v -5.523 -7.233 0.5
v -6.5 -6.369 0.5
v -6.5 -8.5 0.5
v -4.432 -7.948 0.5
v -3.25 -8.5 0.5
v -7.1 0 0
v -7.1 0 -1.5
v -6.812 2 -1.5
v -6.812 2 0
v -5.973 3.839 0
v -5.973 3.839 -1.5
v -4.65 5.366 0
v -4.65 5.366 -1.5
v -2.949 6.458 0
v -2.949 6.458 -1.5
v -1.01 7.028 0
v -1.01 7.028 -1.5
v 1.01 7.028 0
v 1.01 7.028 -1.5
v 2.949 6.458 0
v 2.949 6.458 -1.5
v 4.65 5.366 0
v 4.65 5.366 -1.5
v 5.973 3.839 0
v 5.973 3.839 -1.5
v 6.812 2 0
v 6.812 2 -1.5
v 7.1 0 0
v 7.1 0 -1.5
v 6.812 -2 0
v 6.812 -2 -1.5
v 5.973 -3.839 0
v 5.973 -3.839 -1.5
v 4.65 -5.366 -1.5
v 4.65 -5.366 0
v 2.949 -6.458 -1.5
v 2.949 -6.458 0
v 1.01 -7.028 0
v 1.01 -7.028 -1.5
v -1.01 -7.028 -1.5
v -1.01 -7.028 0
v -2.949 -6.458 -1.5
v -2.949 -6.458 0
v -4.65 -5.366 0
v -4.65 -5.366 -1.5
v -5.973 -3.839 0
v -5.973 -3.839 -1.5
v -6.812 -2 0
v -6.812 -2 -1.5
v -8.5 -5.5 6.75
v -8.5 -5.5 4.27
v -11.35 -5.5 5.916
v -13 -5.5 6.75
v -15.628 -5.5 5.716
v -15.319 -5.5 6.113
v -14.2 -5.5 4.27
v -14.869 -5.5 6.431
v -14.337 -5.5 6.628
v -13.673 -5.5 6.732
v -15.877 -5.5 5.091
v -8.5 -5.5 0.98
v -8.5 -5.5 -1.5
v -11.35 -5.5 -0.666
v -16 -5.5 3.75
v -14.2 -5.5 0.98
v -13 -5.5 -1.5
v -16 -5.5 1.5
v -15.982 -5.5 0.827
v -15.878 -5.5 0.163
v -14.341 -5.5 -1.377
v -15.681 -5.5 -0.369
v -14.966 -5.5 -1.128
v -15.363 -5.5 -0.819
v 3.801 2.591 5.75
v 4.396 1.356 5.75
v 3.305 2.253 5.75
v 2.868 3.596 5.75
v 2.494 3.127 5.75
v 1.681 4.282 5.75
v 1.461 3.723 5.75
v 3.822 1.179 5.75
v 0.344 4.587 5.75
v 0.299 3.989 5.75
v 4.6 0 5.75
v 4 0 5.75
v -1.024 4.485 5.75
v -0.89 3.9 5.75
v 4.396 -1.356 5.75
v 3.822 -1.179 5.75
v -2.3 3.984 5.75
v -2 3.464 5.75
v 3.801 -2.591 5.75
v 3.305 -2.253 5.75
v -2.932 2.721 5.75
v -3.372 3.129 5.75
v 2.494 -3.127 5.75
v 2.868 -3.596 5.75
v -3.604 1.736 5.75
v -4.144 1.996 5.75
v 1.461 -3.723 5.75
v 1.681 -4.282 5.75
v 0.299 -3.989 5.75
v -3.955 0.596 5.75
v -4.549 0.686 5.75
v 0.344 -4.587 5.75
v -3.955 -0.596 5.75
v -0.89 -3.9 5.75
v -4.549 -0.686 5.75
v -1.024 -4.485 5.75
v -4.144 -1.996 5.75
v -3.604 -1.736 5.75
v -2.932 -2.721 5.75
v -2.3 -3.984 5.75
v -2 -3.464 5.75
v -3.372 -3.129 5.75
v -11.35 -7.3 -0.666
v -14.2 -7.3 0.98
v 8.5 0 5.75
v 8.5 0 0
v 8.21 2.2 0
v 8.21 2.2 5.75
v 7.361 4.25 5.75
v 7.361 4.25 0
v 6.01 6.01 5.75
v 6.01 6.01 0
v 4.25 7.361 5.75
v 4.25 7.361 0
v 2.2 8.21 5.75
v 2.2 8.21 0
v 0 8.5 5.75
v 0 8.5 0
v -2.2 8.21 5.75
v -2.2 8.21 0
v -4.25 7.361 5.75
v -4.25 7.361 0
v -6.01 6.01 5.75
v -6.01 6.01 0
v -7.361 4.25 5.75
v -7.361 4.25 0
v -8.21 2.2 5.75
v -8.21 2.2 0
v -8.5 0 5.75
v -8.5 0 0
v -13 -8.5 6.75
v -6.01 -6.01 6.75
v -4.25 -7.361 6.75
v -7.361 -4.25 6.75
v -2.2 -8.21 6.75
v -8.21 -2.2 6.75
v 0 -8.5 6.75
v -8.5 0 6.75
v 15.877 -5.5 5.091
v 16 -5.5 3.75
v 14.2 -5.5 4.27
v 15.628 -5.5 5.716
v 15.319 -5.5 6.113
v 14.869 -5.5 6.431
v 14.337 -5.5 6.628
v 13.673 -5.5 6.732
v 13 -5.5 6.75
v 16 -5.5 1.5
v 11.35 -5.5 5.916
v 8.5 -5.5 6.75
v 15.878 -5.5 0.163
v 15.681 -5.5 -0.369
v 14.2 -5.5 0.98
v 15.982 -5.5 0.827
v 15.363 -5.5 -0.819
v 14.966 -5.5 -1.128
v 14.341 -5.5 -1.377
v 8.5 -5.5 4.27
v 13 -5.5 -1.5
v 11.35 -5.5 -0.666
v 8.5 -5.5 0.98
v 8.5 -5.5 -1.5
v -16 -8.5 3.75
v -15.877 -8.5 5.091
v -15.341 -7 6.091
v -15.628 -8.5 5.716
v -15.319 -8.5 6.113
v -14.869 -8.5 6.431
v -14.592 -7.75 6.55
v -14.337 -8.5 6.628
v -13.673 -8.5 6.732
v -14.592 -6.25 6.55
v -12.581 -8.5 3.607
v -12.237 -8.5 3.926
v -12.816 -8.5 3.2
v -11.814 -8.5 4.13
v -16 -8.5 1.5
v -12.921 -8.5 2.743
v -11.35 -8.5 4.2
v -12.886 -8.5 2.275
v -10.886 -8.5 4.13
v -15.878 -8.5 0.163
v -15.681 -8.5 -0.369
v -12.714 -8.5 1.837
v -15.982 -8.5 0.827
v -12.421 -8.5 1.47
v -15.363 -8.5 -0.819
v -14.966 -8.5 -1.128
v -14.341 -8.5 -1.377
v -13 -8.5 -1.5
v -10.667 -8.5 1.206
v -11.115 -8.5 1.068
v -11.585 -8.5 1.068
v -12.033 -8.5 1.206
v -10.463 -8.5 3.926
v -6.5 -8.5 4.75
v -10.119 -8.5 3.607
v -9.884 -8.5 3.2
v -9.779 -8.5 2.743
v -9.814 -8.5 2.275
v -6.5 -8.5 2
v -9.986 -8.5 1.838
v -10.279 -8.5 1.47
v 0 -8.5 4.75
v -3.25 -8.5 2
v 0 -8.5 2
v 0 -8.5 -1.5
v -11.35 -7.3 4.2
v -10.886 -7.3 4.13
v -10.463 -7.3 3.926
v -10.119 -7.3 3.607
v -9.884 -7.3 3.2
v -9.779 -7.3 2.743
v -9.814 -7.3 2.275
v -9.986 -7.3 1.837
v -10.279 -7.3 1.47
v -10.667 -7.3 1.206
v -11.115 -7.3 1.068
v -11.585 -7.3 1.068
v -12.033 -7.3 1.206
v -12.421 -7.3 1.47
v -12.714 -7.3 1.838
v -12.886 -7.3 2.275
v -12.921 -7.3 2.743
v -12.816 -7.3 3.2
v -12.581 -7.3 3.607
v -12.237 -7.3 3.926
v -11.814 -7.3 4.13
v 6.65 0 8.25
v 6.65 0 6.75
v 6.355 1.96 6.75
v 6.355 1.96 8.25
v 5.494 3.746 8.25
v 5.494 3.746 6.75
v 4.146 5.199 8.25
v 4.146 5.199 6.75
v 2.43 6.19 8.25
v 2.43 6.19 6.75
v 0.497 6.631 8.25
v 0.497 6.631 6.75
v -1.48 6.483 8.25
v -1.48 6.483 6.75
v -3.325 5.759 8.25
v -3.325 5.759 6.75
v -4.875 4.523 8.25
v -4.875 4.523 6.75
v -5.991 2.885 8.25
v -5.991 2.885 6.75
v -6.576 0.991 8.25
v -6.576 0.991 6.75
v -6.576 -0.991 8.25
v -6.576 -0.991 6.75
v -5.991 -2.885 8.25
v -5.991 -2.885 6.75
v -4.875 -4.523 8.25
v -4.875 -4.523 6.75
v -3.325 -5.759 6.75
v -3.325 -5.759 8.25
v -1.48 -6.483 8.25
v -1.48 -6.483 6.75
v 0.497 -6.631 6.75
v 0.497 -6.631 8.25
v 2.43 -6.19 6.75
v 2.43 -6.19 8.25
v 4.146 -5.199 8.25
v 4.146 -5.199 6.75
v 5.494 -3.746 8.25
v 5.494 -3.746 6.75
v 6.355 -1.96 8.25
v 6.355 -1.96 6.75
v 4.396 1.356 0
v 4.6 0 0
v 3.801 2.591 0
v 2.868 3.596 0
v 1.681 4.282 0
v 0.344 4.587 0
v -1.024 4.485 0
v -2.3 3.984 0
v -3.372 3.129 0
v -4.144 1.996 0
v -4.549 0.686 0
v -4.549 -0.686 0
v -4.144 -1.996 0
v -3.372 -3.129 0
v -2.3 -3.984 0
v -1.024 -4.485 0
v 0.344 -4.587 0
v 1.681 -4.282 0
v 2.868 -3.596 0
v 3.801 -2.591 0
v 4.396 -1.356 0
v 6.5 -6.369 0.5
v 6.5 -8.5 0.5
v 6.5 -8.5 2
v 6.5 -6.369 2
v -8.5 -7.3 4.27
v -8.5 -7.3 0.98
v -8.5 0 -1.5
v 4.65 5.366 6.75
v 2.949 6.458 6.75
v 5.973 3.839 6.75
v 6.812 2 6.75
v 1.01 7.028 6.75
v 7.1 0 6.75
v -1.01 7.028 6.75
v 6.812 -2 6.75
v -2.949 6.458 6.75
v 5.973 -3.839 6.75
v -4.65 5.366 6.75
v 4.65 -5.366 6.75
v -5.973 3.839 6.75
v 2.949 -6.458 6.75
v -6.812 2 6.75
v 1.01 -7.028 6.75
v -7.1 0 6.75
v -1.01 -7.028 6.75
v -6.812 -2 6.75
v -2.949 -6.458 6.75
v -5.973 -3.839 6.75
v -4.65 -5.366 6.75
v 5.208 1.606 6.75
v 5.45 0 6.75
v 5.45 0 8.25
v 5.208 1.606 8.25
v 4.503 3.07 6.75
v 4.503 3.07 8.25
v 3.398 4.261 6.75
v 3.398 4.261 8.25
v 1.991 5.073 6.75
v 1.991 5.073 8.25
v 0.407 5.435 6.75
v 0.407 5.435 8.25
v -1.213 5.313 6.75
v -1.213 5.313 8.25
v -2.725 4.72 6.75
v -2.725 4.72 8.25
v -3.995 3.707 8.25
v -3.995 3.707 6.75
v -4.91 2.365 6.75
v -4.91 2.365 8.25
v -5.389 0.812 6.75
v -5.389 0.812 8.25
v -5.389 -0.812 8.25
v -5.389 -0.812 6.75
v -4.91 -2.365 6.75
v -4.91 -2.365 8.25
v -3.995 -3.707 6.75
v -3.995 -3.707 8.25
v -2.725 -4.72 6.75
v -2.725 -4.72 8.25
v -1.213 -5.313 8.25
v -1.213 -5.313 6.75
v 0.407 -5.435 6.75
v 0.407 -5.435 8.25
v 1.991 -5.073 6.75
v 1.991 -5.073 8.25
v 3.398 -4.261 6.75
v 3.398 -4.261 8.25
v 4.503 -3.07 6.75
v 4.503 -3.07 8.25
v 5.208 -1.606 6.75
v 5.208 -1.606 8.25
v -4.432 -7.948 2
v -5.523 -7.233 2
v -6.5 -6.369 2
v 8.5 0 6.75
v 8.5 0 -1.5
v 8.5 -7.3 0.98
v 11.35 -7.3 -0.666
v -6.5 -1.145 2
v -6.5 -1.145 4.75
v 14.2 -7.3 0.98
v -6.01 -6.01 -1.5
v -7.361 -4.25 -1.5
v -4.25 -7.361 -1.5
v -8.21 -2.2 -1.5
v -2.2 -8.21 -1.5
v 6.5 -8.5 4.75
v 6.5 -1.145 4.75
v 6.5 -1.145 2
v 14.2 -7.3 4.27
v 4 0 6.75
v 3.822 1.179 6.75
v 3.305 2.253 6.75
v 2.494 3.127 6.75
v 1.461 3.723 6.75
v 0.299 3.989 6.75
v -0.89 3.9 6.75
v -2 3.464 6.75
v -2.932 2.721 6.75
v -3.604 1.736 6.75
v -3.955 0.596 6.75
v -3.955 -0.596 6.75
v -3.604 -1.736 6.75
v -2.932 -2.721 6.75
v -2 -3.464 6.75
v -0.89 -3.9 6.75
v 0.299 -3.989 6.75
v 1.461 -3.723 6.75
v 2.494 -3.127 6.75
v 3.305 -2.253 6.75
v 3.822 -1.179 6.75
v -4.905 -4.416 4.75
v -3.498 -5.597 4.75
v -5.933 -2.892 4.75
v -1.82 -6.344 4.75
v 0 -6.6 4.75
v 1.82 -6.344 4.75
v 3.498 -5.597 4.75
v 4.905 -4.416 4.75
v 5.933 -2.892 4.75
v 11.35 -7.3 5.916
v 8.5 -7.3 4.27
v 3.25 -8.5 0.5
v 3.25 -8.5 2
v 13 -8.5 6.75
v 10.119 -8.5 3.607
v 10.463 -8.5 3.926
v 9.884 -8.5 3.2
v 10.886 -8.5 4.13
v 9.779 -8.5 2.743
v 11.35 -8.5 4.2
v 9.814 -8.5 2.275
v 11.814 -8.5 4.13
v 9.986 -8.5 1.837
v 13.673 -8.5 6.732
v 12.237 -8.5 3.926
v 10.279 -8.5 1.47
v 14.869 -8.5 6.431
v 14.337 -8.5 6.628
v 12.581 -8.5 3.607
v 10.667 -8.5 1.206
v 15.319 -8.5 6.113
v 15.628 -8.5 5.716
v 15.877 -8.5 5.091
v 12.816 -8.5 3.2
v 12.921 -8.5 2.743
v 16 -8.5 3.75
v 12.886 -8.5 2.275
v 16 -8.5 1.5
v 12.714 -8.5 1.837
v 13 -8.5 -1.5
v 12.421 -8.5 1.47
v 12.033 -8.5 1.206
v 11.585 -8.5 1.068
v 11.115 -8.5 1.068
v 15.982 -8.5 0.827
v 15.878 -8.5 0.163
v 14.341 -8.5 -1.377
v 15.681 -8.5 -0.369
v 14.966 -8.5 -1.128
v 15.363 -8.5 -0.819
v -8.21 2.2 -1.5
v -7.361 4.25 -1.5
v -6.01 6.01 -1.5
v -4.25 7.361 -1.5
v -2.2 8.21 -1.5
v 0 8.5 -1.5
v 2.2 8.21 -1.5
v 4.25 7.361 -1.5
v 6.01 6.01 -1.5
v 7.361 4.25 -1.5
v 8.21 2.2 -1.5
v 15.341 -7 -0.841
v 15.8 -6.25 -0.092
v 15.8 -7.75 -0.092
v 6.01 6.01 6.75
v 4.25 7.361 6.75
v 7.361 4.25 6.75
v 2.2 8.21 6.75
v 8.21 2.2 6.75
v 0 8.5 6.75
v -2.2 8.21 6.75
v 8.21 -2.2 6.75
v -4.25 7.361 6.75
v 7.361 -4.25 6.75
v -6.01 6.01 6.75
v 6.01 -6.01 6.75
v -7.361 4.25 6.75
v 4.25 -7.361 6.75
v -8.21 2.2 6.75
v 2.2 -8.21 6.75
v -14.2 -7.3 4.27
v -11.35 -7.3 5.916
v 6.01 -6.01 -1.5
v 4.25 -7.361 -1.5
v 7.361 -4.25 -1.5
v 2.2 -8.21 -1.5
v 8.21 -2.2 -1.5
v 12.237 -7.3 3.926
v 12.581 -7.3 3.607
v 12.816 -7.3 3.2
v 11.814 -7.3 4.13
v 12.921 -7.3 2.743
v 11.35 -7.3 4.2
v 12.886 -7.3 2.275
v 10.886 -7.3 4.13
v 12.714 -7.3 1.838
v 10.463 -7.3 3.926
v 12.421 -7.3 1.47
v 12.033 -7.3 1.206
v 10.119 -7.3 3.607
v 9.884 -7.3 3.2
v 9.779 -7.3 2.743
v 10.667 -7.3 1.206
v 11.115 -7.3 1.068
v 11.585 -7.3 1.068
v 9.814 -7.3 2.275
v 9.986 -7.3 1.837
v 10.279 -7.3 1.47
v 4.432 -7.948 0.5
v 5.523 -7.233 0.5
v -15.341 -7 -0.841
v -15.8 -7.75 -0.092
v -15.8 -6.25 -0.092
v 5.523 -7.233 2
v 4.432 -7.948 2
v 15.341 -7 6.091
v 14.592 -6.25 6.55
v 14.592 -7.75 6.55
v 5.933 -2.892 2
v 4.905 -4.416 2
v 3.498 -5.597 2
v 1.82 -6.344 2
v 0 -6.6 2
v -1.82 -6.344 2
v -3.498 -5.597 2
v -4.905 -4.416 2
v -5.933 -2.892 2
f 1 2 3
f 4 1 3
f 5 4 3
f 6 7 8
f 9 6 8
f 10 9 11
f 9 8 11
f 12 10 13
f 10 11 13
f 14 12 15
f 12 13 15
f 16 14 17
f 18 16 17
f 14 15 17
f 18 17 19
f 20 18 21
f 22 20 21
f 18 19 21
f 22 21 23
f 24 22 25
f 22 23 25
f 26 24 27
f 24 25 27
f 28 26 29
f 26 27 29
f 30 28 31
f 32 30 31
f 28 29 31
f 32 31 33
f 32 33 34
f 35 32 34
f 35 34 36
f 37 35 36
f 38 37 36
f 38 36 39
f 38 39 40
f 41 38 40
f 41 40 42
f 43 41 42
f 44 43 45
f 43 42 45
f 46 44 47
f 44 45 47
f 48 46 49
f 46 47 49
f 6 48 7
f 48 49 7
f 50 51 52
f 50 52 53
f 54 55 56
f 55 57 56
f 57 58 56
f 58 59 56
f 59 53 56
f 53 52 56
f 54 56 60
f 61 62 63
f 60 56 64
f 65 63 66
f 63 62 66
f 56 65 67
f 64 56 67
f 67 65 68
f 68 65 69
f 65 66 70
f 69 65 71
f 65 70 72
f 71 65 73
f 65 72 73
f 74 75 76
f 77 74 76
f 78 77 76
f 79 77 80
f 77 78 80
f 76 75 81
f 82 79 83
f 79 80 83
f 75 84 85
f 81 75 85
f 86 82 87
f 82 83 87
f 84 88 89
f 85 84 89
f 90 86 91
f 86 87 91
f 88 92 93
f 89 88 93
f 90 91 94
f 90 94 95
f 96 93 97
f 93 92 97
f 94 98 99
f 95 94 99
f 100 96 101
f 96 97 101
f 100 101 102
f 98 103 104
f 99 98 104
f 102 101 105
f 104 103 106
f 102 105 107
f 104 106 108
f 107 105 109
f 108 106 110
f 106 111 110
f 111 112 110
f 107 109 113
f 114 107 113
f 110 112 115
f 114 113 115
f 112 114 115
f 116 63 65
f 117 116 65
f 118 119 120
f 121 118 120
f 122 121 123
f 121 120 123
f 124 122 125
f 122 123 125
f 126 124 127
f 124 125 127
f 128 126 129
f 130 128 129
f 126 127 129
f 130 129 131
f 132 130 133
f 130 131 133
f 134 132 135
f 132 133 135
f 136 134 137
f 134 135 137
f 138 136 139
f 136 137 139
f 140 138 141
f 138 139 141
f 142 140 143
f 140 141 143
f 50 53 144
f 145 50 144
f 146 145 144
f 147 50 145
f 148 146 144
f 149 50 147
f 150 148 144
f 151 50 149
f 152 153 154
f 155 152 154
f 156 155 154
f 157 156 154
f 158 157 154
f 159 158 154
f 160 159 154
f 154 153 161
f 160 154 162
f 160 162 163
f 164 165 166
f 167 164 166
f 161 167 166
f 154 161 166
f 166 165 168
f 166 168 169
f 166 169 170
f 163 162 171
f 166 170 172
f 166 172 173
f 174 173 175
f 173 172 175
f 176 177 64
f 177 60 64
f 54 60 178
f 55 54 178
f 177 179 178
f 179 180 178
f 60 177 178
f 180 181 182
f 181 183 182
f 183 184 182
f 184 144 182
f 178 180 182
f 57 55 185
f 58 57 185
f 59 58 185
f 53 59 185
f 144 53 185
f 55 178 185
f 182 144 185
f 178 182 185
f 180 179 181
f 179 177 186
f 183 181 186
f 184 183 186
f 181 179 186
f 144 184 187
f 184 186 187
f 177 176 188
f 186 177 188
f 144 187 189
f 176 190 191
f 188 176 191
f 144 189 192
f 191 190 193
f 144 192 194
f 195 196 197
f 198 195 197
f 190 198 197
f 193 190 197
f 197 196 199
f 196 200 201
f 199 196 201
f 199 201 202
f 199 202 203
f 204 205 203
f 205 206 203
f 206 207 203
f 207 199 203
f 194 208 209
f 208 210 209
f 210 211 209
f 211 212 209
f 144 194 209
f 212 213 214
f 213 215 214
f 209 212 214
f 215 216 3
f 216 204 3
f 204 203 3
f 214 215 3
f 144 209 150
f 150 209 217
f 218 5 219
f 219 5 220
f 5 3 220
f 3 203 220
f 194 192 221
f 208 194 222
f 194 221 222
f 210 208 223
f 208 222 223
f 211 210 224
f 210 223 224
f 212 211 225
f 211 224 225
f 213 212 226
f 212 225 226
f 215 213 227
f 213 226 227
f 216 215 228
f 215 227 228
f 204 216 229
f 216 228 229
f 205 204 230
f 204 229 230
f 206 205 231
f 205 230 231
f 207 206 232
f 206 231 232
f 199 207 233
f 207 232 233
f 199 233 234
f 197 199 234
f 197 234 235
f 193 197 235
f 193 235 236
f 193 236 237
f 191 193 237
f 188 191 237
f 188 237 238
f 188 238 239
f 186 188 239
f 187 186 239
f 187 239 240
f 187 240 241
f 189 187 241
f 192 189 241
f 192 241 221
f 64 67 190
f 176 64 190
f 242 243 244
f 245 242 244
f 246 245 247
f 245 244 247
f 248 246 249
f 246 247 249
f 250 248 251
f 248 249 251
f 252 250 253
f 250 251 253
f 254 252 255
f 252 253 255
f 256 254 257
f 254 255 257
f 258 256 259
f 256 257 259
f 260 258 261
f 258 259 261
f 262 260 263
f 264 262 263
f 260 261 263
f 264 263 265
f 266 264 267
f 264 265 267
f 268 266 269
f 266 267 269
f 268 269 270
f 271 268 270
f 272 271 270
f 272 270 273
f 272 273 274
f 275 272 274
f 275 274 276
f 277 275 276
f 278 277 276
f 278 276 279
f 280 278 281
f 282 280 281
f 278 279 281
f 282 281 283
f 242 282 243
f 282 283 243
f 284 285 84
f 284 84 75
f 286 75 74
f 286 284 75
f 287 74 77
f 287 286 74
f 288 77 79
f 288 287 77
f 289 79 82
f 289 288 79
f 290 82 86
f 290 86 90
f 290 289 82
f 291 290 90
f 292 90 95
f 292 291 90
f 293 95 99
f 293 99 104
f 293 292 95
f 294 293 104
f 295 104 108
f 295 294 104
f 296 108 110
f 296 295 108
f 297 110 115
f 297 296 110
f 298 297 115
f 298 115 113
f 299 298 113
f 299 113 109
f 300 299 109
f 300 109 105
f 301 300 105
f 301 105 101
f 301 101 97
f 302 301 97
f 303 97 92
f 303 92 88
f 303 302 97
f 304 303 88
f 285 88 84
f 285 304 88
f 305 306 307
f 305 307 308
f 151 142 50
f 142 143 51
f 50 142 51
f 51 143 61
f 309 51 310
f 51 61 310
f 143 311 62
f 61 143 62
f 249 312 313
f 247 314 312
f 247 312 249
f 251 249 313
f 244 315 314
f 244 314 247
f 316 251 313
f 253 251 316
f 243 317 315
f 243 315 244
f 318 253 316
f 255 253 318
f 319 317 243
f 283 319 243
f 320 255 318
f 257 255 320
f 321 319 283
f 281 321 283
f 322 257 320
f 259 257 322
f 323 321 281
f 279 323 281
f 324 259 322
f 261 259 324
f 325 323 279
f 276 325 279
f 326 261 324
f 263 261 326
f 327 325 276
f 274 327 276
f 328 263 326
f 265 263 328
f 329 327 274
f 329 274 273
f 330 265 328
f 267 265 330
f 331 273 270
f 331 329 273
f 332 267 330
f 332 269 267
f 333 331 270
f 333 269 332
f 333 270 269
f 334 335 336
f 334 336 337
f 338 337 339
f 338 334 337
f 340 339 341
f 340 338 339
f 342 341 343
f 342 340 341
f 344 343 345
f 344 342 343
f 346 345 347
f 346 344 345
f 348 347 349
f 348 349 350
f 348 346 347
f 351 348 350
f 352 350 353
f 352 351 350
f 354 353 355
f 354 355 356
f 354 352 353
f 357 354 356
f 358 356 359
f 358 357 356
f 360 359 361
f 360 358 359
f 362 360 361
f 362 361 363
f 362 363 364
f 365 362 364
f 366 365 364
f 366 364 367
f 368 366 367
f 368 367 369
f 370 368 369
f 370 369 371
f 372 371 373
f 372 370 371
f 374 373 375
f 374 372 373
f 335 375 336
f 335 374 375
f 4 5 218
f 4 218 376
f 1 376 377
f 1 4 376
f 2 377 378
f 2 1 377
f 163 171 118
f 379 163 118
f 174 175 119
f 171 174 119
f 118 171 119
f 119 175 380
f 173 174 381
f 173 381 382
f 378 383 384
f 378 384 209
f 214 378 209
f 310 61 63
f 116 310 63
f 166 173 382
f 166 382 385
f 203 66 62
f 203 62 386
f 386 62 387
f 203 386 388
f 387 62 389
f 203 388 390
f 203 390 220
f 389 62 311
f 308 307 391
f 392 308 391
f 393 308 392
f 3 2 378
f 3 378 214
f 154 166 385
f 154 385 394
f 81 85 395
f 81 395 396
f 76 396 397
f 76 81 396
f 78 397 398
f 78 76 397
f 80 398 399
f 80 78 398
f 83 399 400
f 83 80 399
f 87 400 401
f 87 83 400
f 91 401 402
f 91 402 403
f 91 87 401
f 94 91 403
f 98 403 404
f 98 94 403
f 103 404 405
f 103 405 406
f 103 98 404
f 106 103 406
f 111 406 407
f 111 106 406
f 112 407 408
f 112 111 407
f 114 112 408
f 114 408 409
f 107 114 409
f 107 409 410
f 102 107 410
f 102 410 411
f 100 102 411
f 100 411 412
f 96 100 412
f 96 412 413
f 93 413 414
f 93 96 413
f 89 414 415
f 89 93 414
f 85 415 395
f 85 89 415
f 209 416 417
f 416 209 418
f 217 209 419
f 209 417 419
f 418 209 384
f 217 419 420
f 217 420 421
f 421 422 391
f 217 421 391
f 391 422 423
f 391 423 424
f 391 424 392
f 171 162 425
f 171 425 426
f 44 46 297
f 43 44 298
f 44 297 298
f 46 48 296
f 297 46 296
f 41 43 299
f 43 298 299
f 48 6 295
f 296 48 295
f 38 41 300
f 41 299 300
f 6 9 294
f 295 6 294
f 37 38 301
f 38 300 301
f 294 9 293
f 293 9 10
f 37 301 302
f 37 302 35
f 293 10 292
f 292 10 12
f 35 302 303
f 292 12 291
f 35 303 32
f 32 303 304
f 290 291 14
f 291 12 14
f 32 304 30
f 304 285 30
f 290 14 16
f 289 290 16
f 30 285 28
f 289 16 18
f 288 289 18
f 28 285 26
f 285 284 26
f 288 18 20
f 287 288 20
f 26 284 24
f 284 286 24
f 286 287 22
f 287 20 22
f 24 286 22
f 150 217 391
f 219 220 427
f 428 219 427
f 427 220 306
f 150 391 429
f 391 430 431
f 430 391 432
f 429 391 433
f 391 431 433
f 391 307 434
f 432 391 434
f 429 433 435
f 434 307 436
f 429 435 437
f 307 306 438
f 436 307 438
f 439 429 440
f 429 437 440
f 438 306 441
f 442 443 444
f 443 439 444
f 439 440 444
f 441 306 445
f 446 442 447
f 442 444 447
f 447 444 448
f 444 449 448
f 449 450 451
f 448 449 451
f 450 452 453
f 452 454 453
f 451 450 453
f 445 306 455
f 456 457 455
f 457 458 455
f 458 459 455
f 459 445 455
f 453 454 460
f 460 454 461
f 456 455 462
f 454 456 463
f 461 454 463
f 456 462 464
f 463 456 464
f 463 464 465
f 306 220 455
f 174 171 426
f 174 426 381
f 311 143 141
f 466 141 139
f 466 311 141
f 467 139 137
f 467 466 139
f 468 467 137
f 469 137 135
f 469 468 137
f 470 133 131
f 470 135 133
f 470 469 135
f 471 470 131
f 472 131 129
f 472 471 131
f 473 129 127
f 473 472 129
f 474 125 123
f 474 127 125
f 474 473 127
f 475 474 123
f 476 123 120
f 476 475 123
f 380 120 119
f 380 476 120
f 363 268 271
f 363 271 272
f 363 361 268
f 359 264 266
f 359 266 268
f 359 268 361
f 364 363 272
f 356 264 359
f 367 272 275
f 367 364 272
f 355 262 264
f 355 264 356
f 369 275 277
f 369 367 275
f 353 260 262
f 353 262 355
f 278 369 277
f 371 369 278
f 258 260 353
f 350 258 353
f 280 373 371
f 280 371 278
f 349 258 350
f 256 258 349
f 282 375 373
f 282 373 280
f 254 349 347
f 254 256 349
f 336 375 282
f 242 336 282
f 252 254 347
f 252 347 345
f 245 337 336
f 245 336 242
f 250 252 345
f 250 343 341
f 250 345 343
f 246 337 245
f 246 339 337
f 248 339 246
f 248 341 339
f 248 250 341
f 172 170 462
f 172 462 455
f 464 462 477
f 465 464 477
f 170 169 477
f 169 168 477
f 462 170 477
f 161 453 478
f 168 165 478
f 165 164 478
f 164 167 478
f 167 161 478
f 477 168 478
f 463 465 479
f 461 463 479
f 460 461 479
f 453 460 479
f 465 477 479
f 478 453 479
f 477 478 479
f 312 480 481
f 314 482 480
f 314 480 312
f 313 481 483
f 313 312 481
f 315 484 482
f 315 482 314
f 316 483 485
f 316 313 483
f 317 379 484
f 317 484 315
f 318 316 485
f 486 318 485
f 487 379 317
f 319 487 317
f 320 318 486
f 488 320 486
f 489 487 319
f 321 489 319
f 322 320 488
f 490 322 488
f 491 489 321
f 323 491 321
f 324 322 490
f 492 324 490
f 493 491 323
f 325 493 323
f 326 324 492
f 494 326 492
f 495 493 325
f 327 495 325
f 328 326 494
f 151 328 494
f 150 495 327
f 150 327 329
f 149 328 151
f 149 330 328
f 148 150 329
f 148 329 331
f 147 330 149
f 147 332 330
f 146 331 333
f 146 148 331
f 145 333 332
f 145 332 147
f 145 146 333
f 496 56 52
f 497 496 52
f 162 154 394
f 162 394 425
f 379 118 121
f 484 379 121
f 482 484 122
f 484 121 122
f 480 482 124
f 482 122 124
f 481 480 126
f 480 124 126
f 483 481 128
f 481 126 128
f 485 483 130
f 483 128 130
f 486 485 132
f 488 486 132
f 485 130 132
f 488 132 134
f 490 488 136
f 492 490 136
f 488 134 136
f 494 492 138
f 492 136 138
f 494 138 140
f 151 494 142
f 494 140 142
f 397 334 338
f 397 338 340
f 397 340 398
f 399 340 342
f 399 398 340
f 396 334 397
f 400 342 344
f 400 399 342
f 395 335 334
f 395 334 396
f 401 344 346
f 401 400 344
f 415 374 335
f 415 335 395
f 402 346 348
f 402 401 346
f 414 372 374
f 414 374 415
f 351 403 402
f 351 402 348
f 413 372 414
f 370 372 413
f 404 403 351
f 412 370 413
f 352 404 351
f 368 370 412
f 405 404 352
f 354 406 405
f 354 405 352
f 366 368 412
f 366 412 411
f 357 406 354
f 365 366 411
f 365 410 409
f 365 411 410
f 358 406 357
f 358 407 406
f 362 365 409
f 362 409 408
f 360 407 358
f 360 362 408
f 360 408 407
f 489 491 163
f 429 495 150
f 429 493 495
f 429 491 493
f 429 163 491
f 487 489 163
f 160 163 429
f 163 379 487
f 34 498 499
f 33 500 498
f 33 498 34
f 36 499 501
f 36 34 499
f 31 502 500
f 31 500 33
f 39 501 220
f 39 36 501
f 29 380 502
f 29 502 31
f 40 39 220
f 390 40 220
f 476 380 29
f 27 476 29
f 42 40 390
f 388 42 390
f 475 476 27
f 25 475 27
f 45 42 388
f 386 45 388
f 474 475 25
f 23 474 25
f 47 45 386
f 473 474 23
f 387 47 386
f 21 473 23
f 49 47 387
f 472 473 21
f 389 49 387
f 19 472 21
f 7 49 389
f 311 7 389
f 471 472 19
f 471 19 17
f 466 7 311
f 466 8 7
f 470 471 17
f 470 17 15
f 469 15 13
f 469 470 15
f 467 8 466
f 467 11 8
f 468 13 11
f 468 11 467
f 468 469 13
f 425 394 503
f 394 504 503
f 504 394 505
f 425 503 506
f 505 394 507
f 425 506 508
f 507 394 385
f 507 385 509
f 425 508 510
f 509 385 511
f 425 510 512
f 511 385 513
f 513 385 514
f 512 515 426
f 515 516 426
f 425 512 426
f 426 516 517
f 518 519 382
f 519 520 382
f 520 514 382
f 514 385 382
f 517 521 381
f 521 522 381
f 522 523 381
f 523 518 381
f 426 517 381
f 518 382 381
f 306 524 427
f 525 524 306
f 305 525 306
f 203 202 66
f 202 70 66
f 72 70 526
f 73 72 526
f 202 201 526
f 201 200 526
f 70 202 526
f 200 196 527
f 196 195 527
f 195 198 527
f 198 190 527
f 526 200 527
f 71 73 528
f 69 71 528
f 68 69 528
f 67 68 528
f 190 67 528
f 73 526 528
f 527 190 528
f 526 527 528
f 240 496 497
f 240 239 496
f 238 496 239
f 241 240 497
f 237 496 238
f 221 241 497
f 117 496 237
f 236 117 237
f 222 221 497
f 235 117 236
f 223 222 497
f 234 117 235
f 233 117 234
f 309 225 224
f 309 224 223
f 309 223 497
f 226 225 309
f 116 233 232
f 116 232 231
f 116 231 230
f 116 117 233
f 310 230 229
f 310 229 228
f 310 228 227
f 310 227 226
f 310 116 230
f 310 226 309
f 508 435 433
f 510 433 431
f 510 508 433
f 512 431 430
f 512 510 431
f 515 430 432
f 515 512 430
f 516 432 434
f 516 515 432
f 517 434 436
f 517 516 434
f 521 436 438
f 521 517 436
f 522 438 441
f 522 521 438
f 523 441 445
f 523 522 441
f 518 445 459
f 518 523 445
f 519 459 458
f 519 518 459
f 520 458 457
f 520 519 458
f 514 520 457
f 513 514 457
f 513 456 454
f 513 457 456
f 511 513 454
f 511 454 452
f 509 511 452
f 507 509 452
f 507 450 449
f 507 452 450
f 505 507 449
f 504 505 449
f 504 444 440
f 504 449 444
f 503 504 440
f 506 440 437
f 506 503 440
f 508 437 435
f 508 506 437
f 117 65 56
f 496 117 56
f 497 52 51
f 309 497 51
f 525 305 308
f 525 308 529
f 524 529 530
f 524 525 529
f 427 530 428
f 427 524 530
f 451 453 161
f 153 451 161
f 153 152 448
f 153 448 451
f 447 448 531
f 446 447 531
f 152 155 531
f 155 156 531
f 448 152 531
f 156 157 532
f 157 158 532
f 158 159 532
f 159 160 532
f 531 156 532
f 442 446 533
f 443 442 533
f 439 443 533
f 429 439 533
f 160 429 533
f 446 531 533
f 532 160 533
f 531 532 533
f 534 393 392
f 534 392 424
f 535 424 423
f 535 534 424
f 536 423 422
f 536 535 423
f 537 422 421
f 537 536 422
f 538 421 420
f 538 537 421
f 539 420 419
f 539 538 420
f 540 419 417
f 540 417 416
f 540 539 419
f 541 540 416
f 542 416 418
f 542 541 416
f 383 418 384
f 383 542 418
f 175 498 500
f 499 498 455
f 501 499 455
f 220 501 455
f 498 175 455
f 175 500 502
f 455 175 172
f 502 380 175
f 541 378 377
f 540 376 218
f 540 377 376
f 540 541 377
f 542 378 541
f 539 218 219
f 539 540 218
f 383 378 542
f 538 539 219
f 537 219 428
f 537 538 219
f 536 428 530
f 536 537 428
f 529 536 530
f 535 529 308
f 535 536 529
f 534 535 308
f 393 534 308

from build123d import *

# Parameters (mm, degrees)
SKETCH1_R           = 8.5
SKETCH1_R_2         = 4.6
BOSS_EXTRUDE1_DEPTH = 5.75
BOSS_EXTRUDE2_START = 1.5
SKETCH2_R           = 8.5
SKETCH2_R_2         = 7.1
BOSS_EXTRUDE2_DEPTH = 1.5
SKETCH3_R           = 8.5
SKETCH3_R_2         = 4
BOSS_EXTRUDE3_DEPTH = 1
SKETCH4_R           = 6.65
SKETCH4_R_2         = 5.45
BOSS_EXTRUDE4_DEPTH = 1.5
BOSS_EXTRUDE5_START = -8.25
SKETCH5_R           = 7.1
BOSS_EXTRUDE5_DEPTH = 8.25
FILLET1_SIZE        = 3
SKETCH6_R           = 1.575
CUT_EXTRUDE1_DEPTH  = 1.8
SKETCH6_3_R         = 1.575
CUT_EXTRUDE2_DEPTH  = 23.804878934
SHELL1_START        = 2
SHELL1_DEPTH        = 2.75
SHELL1_START_2      = 0.5
SHELL1_2_DEPTH      = 1.5


with BuildPart() as part:
    # Sketch1 → Boss-Extrude1 (new body)
    with BuildSketch(Plane.XY):
        Circle(SKETCH1_R)
        Circle(SKETCH1_R_2, mode=Mode.SUBTRACT)
    extrude(amount=BOSS_EXTRUDE1_DEPTH)

    # Sketch2 → Boss-Extrude2 (add)
    with BuildSketch(Plane(origin=(0, 0, 0), x_dir=(-1, 0, 0), z_dir=(0, 0, -1)).offset(BOSS_EXTRUDE2_START)):
        Circle(SKETCH2_R)
        Circle(SKETCH2_R_2, mode=Mode.SUBTRACT)
    extrude(amount=-BOSS_EXTRUDE2_DEPTH)

    # Sketch3 → Boss-Extrude3 (add)
    with BuildSketch(Plane.XY.offset(5.75)):
        with Locations(Location((0, 0, 0), (0, 0, 180))):
            Circle(SKETCH3_R)
        Circle(SKETCH3_R_2, mode=Mode.SUBTRACT)
    extrude(amount=BOSS_EXTRUDE3_DEPTH)

    # Sketch4 → Boss-Extrude4 (add)
    with BuildSketch(Plane.XY.offset(6.75)):
        Circle(SKETCH4_R)
        Circle(SKETCH4_R_2, mode=Mode.SUBTRACT)
    extrude(amount=BOSS_EXTRUDE4_DEPTH)

    # Sketch5 → Boss-Extrude5 (add)
    with BuildSketch(Plane.XY.offset(6.75).offset(BOSS_EXTRUDE5_START)):
        with BuildLine():
            Line((-8.5, 0), (-8.5, -5.5))
            Line((-8.5, -5.5), (-16, -5.5))
            Line((-16, -5.5), (-16, -8.5))
            Line((-16, -8.5), (16, -8.5))
            Line((16, -8.5), (16, -5.5))
            Line((16, -5.5), (8.5, -5.5))
            Line((8.5, -5.5), (8.5, 0))
            ThreePointArc((8.5, 0), (0, 8.5), (-8.5, 0))
        make_face()
        with Locations(Location((0, 0, 0), (0, 0, 180))):
            Circle(SKETCH5_R, mode=Mode.SUBTRACT)
    extrude(amount=BOSS_EXTRUDE5_DEPTH)

    # Fillet1
    # a fillet whose section is not a circle: 3 mm, written as the material it takes off along each edge
    with BuildSketch(Plane(origin=(-16, 2, -1.5), x_dir=(0, 0, 1), z_dir=(0, -1, 0)), Plane(origin=(-16, 2, 6.75), x_dir=(1, 0, 0), z_dir=(0, -1, 0)), Plane(origin=(16, -16, -1.5), x_dir=(0, 0, 1), z_dir=(0, 1, 0)), Plane(origin=(16, -16, 6.75), x_dir=(-1, 0, 0), z_dir=(0, 1, 0))) as fillet1_piece_1:
        with BuildLine():
            add(Edge.make_bspline([(FILLET1_SIZE, 0), (FILLET1_SIZE * 0.831801948466, 0), (FILLET1_SIZE * 0.663603896932, 0), (FILLET1_SIZE * 0.292893218813, -FILLET1_SIZE * 0.0716919198361), (FILLET1_SIZE * 0.0716919198361, -FILLET1_SIZE * 0.292893218813), (0, -FILLET1_SIZE * 0.663603896932), (0, -FILLET1_SIZE * 0.831801948466), (0, -FILLET1_SIZE)], knots=[0, 0, 0, 0, 0, 0, 0.5, 0.5, 1, 1, 1, 1, 1, 1], degree=5))
            Line((0, -FILLET1_SIZE), (0, 0))
            Line((0, 0), (FILLET1_SIZE, 0))
        make_face()
    extrude(amount=18, mode=Mode.SUBTRACT)

    # Sketch6 → Cut-Extrude1 (cut)
    # profile 1 of 2: a face of its own
    with BuildSketch(Plane(origin=(0, -5.5, 0), x_dir=(1, 0, 0), z_dir=(0, 1, 0))):
        Polygon((-11.35, 0.665896534), (-14.2, -0.979551733), (-14.2, -4.270448267), (-11.35, -5.915896534), (-8.5, -4.270448267), (-8.5, -0.979551733), align=None)
        with Locations((-11.35, -2.625)):
            Circle(SKETCH6_R, mode=Mode.SUBTRACT)
    # profile 2 of 2: a face of its own
    with BuildSketch(Plane(origin=(0, -5.5, 0), x_dir=(1, 0, 0), z_dir=(0, 1, 0))):
        with Locations((-11.35, -2.625)):
            Circle(SKETCH6_R)
    cut_extrude1 = extrude(amount=-CUT_EXTRUDE1_DEPTH, mode=Mode.SUBTRACT)

    # Sketch6<3> → Cut-Extrude2 (cut, through all)
    with BuildSketch(Plane(origin=(0, -5.5, 0), x_dir=(1, 0, 0), z_dir=(0, 1, 0))):
        with Locations(Location((-11.35, -2.625, 0), (0, 0, 270))):
            Circle(SKETCH6_3_R)
    cut_extrude2 = extrude(amount=-CUT_EXTRUDE2_DEPTH, mode=Mode.SUBTRACT)

    # Mirror1: Cut-Extrude1, Cut-Extrude2 across plane
    add(cut_extrude1.mirror(Plane(origin=(0, 0, 0), x_dir=(0, 0, 1), z_dir=(1, 0, 0))), mode=Mode.SUBTRACT)
    add(cut_extrude2.mirror(Plane(origin=(0, 0, 0), x_dir=(0, 0, 1), z_dir=(1, 0, 0))), mode=Mode.SUBTRACT)

    # Shell1: read off the stored shape, not the designer's step
    # Shell1 outline → Shell1 (cut)
    with BuildSketch(Plane.XY.offset(SHELL1_START)):
        with BuildLine():
            ThreePointArc((6.5, -1.144552314), (0, -6.6), (-6.5, -1.144552314))
            Line((-6.5, -1.144552314), (-6.5, -8.5))
            Line((-6.5, -8.5), (6.5, -8.5))
            Line((6.5, -8.5), (6.5, -1.144552314))
        make_face()
    extrude(amount=SHELL1_DEPTH, mode=Mode.SUBTRACT)

    # Shell1 2 outline → Shell1 2 (cut)
    with BuildSketch(Plane.XY.offset(SHELL1_START_2)):
        with BuildLine():
            Line((6.5, -8.5), (6.5, -6.368673331))
            ThreePointArc((6.5, -6.368673331), (4.989928684, -7.609902216), (3.249615362, -8.5))
            Line((3.249615362, -8.5), (6.5, -8.5))
        make_face()
        with BuildLine():
            ThreePointArc((-3.249615362, -8.5), (-4.989928684, -7.609902216), (-6.5, -6.368673331))
            Line((-6.5, -6.368673331), (-6.5, -8.5))
            Line((-6.5, -8.5), (-3.249615362, -8.5))
        make_face()
    extrude(amount=SHELL1_2_DEPTH, mode=Mode.SUBTRACT)


solid = part.part
